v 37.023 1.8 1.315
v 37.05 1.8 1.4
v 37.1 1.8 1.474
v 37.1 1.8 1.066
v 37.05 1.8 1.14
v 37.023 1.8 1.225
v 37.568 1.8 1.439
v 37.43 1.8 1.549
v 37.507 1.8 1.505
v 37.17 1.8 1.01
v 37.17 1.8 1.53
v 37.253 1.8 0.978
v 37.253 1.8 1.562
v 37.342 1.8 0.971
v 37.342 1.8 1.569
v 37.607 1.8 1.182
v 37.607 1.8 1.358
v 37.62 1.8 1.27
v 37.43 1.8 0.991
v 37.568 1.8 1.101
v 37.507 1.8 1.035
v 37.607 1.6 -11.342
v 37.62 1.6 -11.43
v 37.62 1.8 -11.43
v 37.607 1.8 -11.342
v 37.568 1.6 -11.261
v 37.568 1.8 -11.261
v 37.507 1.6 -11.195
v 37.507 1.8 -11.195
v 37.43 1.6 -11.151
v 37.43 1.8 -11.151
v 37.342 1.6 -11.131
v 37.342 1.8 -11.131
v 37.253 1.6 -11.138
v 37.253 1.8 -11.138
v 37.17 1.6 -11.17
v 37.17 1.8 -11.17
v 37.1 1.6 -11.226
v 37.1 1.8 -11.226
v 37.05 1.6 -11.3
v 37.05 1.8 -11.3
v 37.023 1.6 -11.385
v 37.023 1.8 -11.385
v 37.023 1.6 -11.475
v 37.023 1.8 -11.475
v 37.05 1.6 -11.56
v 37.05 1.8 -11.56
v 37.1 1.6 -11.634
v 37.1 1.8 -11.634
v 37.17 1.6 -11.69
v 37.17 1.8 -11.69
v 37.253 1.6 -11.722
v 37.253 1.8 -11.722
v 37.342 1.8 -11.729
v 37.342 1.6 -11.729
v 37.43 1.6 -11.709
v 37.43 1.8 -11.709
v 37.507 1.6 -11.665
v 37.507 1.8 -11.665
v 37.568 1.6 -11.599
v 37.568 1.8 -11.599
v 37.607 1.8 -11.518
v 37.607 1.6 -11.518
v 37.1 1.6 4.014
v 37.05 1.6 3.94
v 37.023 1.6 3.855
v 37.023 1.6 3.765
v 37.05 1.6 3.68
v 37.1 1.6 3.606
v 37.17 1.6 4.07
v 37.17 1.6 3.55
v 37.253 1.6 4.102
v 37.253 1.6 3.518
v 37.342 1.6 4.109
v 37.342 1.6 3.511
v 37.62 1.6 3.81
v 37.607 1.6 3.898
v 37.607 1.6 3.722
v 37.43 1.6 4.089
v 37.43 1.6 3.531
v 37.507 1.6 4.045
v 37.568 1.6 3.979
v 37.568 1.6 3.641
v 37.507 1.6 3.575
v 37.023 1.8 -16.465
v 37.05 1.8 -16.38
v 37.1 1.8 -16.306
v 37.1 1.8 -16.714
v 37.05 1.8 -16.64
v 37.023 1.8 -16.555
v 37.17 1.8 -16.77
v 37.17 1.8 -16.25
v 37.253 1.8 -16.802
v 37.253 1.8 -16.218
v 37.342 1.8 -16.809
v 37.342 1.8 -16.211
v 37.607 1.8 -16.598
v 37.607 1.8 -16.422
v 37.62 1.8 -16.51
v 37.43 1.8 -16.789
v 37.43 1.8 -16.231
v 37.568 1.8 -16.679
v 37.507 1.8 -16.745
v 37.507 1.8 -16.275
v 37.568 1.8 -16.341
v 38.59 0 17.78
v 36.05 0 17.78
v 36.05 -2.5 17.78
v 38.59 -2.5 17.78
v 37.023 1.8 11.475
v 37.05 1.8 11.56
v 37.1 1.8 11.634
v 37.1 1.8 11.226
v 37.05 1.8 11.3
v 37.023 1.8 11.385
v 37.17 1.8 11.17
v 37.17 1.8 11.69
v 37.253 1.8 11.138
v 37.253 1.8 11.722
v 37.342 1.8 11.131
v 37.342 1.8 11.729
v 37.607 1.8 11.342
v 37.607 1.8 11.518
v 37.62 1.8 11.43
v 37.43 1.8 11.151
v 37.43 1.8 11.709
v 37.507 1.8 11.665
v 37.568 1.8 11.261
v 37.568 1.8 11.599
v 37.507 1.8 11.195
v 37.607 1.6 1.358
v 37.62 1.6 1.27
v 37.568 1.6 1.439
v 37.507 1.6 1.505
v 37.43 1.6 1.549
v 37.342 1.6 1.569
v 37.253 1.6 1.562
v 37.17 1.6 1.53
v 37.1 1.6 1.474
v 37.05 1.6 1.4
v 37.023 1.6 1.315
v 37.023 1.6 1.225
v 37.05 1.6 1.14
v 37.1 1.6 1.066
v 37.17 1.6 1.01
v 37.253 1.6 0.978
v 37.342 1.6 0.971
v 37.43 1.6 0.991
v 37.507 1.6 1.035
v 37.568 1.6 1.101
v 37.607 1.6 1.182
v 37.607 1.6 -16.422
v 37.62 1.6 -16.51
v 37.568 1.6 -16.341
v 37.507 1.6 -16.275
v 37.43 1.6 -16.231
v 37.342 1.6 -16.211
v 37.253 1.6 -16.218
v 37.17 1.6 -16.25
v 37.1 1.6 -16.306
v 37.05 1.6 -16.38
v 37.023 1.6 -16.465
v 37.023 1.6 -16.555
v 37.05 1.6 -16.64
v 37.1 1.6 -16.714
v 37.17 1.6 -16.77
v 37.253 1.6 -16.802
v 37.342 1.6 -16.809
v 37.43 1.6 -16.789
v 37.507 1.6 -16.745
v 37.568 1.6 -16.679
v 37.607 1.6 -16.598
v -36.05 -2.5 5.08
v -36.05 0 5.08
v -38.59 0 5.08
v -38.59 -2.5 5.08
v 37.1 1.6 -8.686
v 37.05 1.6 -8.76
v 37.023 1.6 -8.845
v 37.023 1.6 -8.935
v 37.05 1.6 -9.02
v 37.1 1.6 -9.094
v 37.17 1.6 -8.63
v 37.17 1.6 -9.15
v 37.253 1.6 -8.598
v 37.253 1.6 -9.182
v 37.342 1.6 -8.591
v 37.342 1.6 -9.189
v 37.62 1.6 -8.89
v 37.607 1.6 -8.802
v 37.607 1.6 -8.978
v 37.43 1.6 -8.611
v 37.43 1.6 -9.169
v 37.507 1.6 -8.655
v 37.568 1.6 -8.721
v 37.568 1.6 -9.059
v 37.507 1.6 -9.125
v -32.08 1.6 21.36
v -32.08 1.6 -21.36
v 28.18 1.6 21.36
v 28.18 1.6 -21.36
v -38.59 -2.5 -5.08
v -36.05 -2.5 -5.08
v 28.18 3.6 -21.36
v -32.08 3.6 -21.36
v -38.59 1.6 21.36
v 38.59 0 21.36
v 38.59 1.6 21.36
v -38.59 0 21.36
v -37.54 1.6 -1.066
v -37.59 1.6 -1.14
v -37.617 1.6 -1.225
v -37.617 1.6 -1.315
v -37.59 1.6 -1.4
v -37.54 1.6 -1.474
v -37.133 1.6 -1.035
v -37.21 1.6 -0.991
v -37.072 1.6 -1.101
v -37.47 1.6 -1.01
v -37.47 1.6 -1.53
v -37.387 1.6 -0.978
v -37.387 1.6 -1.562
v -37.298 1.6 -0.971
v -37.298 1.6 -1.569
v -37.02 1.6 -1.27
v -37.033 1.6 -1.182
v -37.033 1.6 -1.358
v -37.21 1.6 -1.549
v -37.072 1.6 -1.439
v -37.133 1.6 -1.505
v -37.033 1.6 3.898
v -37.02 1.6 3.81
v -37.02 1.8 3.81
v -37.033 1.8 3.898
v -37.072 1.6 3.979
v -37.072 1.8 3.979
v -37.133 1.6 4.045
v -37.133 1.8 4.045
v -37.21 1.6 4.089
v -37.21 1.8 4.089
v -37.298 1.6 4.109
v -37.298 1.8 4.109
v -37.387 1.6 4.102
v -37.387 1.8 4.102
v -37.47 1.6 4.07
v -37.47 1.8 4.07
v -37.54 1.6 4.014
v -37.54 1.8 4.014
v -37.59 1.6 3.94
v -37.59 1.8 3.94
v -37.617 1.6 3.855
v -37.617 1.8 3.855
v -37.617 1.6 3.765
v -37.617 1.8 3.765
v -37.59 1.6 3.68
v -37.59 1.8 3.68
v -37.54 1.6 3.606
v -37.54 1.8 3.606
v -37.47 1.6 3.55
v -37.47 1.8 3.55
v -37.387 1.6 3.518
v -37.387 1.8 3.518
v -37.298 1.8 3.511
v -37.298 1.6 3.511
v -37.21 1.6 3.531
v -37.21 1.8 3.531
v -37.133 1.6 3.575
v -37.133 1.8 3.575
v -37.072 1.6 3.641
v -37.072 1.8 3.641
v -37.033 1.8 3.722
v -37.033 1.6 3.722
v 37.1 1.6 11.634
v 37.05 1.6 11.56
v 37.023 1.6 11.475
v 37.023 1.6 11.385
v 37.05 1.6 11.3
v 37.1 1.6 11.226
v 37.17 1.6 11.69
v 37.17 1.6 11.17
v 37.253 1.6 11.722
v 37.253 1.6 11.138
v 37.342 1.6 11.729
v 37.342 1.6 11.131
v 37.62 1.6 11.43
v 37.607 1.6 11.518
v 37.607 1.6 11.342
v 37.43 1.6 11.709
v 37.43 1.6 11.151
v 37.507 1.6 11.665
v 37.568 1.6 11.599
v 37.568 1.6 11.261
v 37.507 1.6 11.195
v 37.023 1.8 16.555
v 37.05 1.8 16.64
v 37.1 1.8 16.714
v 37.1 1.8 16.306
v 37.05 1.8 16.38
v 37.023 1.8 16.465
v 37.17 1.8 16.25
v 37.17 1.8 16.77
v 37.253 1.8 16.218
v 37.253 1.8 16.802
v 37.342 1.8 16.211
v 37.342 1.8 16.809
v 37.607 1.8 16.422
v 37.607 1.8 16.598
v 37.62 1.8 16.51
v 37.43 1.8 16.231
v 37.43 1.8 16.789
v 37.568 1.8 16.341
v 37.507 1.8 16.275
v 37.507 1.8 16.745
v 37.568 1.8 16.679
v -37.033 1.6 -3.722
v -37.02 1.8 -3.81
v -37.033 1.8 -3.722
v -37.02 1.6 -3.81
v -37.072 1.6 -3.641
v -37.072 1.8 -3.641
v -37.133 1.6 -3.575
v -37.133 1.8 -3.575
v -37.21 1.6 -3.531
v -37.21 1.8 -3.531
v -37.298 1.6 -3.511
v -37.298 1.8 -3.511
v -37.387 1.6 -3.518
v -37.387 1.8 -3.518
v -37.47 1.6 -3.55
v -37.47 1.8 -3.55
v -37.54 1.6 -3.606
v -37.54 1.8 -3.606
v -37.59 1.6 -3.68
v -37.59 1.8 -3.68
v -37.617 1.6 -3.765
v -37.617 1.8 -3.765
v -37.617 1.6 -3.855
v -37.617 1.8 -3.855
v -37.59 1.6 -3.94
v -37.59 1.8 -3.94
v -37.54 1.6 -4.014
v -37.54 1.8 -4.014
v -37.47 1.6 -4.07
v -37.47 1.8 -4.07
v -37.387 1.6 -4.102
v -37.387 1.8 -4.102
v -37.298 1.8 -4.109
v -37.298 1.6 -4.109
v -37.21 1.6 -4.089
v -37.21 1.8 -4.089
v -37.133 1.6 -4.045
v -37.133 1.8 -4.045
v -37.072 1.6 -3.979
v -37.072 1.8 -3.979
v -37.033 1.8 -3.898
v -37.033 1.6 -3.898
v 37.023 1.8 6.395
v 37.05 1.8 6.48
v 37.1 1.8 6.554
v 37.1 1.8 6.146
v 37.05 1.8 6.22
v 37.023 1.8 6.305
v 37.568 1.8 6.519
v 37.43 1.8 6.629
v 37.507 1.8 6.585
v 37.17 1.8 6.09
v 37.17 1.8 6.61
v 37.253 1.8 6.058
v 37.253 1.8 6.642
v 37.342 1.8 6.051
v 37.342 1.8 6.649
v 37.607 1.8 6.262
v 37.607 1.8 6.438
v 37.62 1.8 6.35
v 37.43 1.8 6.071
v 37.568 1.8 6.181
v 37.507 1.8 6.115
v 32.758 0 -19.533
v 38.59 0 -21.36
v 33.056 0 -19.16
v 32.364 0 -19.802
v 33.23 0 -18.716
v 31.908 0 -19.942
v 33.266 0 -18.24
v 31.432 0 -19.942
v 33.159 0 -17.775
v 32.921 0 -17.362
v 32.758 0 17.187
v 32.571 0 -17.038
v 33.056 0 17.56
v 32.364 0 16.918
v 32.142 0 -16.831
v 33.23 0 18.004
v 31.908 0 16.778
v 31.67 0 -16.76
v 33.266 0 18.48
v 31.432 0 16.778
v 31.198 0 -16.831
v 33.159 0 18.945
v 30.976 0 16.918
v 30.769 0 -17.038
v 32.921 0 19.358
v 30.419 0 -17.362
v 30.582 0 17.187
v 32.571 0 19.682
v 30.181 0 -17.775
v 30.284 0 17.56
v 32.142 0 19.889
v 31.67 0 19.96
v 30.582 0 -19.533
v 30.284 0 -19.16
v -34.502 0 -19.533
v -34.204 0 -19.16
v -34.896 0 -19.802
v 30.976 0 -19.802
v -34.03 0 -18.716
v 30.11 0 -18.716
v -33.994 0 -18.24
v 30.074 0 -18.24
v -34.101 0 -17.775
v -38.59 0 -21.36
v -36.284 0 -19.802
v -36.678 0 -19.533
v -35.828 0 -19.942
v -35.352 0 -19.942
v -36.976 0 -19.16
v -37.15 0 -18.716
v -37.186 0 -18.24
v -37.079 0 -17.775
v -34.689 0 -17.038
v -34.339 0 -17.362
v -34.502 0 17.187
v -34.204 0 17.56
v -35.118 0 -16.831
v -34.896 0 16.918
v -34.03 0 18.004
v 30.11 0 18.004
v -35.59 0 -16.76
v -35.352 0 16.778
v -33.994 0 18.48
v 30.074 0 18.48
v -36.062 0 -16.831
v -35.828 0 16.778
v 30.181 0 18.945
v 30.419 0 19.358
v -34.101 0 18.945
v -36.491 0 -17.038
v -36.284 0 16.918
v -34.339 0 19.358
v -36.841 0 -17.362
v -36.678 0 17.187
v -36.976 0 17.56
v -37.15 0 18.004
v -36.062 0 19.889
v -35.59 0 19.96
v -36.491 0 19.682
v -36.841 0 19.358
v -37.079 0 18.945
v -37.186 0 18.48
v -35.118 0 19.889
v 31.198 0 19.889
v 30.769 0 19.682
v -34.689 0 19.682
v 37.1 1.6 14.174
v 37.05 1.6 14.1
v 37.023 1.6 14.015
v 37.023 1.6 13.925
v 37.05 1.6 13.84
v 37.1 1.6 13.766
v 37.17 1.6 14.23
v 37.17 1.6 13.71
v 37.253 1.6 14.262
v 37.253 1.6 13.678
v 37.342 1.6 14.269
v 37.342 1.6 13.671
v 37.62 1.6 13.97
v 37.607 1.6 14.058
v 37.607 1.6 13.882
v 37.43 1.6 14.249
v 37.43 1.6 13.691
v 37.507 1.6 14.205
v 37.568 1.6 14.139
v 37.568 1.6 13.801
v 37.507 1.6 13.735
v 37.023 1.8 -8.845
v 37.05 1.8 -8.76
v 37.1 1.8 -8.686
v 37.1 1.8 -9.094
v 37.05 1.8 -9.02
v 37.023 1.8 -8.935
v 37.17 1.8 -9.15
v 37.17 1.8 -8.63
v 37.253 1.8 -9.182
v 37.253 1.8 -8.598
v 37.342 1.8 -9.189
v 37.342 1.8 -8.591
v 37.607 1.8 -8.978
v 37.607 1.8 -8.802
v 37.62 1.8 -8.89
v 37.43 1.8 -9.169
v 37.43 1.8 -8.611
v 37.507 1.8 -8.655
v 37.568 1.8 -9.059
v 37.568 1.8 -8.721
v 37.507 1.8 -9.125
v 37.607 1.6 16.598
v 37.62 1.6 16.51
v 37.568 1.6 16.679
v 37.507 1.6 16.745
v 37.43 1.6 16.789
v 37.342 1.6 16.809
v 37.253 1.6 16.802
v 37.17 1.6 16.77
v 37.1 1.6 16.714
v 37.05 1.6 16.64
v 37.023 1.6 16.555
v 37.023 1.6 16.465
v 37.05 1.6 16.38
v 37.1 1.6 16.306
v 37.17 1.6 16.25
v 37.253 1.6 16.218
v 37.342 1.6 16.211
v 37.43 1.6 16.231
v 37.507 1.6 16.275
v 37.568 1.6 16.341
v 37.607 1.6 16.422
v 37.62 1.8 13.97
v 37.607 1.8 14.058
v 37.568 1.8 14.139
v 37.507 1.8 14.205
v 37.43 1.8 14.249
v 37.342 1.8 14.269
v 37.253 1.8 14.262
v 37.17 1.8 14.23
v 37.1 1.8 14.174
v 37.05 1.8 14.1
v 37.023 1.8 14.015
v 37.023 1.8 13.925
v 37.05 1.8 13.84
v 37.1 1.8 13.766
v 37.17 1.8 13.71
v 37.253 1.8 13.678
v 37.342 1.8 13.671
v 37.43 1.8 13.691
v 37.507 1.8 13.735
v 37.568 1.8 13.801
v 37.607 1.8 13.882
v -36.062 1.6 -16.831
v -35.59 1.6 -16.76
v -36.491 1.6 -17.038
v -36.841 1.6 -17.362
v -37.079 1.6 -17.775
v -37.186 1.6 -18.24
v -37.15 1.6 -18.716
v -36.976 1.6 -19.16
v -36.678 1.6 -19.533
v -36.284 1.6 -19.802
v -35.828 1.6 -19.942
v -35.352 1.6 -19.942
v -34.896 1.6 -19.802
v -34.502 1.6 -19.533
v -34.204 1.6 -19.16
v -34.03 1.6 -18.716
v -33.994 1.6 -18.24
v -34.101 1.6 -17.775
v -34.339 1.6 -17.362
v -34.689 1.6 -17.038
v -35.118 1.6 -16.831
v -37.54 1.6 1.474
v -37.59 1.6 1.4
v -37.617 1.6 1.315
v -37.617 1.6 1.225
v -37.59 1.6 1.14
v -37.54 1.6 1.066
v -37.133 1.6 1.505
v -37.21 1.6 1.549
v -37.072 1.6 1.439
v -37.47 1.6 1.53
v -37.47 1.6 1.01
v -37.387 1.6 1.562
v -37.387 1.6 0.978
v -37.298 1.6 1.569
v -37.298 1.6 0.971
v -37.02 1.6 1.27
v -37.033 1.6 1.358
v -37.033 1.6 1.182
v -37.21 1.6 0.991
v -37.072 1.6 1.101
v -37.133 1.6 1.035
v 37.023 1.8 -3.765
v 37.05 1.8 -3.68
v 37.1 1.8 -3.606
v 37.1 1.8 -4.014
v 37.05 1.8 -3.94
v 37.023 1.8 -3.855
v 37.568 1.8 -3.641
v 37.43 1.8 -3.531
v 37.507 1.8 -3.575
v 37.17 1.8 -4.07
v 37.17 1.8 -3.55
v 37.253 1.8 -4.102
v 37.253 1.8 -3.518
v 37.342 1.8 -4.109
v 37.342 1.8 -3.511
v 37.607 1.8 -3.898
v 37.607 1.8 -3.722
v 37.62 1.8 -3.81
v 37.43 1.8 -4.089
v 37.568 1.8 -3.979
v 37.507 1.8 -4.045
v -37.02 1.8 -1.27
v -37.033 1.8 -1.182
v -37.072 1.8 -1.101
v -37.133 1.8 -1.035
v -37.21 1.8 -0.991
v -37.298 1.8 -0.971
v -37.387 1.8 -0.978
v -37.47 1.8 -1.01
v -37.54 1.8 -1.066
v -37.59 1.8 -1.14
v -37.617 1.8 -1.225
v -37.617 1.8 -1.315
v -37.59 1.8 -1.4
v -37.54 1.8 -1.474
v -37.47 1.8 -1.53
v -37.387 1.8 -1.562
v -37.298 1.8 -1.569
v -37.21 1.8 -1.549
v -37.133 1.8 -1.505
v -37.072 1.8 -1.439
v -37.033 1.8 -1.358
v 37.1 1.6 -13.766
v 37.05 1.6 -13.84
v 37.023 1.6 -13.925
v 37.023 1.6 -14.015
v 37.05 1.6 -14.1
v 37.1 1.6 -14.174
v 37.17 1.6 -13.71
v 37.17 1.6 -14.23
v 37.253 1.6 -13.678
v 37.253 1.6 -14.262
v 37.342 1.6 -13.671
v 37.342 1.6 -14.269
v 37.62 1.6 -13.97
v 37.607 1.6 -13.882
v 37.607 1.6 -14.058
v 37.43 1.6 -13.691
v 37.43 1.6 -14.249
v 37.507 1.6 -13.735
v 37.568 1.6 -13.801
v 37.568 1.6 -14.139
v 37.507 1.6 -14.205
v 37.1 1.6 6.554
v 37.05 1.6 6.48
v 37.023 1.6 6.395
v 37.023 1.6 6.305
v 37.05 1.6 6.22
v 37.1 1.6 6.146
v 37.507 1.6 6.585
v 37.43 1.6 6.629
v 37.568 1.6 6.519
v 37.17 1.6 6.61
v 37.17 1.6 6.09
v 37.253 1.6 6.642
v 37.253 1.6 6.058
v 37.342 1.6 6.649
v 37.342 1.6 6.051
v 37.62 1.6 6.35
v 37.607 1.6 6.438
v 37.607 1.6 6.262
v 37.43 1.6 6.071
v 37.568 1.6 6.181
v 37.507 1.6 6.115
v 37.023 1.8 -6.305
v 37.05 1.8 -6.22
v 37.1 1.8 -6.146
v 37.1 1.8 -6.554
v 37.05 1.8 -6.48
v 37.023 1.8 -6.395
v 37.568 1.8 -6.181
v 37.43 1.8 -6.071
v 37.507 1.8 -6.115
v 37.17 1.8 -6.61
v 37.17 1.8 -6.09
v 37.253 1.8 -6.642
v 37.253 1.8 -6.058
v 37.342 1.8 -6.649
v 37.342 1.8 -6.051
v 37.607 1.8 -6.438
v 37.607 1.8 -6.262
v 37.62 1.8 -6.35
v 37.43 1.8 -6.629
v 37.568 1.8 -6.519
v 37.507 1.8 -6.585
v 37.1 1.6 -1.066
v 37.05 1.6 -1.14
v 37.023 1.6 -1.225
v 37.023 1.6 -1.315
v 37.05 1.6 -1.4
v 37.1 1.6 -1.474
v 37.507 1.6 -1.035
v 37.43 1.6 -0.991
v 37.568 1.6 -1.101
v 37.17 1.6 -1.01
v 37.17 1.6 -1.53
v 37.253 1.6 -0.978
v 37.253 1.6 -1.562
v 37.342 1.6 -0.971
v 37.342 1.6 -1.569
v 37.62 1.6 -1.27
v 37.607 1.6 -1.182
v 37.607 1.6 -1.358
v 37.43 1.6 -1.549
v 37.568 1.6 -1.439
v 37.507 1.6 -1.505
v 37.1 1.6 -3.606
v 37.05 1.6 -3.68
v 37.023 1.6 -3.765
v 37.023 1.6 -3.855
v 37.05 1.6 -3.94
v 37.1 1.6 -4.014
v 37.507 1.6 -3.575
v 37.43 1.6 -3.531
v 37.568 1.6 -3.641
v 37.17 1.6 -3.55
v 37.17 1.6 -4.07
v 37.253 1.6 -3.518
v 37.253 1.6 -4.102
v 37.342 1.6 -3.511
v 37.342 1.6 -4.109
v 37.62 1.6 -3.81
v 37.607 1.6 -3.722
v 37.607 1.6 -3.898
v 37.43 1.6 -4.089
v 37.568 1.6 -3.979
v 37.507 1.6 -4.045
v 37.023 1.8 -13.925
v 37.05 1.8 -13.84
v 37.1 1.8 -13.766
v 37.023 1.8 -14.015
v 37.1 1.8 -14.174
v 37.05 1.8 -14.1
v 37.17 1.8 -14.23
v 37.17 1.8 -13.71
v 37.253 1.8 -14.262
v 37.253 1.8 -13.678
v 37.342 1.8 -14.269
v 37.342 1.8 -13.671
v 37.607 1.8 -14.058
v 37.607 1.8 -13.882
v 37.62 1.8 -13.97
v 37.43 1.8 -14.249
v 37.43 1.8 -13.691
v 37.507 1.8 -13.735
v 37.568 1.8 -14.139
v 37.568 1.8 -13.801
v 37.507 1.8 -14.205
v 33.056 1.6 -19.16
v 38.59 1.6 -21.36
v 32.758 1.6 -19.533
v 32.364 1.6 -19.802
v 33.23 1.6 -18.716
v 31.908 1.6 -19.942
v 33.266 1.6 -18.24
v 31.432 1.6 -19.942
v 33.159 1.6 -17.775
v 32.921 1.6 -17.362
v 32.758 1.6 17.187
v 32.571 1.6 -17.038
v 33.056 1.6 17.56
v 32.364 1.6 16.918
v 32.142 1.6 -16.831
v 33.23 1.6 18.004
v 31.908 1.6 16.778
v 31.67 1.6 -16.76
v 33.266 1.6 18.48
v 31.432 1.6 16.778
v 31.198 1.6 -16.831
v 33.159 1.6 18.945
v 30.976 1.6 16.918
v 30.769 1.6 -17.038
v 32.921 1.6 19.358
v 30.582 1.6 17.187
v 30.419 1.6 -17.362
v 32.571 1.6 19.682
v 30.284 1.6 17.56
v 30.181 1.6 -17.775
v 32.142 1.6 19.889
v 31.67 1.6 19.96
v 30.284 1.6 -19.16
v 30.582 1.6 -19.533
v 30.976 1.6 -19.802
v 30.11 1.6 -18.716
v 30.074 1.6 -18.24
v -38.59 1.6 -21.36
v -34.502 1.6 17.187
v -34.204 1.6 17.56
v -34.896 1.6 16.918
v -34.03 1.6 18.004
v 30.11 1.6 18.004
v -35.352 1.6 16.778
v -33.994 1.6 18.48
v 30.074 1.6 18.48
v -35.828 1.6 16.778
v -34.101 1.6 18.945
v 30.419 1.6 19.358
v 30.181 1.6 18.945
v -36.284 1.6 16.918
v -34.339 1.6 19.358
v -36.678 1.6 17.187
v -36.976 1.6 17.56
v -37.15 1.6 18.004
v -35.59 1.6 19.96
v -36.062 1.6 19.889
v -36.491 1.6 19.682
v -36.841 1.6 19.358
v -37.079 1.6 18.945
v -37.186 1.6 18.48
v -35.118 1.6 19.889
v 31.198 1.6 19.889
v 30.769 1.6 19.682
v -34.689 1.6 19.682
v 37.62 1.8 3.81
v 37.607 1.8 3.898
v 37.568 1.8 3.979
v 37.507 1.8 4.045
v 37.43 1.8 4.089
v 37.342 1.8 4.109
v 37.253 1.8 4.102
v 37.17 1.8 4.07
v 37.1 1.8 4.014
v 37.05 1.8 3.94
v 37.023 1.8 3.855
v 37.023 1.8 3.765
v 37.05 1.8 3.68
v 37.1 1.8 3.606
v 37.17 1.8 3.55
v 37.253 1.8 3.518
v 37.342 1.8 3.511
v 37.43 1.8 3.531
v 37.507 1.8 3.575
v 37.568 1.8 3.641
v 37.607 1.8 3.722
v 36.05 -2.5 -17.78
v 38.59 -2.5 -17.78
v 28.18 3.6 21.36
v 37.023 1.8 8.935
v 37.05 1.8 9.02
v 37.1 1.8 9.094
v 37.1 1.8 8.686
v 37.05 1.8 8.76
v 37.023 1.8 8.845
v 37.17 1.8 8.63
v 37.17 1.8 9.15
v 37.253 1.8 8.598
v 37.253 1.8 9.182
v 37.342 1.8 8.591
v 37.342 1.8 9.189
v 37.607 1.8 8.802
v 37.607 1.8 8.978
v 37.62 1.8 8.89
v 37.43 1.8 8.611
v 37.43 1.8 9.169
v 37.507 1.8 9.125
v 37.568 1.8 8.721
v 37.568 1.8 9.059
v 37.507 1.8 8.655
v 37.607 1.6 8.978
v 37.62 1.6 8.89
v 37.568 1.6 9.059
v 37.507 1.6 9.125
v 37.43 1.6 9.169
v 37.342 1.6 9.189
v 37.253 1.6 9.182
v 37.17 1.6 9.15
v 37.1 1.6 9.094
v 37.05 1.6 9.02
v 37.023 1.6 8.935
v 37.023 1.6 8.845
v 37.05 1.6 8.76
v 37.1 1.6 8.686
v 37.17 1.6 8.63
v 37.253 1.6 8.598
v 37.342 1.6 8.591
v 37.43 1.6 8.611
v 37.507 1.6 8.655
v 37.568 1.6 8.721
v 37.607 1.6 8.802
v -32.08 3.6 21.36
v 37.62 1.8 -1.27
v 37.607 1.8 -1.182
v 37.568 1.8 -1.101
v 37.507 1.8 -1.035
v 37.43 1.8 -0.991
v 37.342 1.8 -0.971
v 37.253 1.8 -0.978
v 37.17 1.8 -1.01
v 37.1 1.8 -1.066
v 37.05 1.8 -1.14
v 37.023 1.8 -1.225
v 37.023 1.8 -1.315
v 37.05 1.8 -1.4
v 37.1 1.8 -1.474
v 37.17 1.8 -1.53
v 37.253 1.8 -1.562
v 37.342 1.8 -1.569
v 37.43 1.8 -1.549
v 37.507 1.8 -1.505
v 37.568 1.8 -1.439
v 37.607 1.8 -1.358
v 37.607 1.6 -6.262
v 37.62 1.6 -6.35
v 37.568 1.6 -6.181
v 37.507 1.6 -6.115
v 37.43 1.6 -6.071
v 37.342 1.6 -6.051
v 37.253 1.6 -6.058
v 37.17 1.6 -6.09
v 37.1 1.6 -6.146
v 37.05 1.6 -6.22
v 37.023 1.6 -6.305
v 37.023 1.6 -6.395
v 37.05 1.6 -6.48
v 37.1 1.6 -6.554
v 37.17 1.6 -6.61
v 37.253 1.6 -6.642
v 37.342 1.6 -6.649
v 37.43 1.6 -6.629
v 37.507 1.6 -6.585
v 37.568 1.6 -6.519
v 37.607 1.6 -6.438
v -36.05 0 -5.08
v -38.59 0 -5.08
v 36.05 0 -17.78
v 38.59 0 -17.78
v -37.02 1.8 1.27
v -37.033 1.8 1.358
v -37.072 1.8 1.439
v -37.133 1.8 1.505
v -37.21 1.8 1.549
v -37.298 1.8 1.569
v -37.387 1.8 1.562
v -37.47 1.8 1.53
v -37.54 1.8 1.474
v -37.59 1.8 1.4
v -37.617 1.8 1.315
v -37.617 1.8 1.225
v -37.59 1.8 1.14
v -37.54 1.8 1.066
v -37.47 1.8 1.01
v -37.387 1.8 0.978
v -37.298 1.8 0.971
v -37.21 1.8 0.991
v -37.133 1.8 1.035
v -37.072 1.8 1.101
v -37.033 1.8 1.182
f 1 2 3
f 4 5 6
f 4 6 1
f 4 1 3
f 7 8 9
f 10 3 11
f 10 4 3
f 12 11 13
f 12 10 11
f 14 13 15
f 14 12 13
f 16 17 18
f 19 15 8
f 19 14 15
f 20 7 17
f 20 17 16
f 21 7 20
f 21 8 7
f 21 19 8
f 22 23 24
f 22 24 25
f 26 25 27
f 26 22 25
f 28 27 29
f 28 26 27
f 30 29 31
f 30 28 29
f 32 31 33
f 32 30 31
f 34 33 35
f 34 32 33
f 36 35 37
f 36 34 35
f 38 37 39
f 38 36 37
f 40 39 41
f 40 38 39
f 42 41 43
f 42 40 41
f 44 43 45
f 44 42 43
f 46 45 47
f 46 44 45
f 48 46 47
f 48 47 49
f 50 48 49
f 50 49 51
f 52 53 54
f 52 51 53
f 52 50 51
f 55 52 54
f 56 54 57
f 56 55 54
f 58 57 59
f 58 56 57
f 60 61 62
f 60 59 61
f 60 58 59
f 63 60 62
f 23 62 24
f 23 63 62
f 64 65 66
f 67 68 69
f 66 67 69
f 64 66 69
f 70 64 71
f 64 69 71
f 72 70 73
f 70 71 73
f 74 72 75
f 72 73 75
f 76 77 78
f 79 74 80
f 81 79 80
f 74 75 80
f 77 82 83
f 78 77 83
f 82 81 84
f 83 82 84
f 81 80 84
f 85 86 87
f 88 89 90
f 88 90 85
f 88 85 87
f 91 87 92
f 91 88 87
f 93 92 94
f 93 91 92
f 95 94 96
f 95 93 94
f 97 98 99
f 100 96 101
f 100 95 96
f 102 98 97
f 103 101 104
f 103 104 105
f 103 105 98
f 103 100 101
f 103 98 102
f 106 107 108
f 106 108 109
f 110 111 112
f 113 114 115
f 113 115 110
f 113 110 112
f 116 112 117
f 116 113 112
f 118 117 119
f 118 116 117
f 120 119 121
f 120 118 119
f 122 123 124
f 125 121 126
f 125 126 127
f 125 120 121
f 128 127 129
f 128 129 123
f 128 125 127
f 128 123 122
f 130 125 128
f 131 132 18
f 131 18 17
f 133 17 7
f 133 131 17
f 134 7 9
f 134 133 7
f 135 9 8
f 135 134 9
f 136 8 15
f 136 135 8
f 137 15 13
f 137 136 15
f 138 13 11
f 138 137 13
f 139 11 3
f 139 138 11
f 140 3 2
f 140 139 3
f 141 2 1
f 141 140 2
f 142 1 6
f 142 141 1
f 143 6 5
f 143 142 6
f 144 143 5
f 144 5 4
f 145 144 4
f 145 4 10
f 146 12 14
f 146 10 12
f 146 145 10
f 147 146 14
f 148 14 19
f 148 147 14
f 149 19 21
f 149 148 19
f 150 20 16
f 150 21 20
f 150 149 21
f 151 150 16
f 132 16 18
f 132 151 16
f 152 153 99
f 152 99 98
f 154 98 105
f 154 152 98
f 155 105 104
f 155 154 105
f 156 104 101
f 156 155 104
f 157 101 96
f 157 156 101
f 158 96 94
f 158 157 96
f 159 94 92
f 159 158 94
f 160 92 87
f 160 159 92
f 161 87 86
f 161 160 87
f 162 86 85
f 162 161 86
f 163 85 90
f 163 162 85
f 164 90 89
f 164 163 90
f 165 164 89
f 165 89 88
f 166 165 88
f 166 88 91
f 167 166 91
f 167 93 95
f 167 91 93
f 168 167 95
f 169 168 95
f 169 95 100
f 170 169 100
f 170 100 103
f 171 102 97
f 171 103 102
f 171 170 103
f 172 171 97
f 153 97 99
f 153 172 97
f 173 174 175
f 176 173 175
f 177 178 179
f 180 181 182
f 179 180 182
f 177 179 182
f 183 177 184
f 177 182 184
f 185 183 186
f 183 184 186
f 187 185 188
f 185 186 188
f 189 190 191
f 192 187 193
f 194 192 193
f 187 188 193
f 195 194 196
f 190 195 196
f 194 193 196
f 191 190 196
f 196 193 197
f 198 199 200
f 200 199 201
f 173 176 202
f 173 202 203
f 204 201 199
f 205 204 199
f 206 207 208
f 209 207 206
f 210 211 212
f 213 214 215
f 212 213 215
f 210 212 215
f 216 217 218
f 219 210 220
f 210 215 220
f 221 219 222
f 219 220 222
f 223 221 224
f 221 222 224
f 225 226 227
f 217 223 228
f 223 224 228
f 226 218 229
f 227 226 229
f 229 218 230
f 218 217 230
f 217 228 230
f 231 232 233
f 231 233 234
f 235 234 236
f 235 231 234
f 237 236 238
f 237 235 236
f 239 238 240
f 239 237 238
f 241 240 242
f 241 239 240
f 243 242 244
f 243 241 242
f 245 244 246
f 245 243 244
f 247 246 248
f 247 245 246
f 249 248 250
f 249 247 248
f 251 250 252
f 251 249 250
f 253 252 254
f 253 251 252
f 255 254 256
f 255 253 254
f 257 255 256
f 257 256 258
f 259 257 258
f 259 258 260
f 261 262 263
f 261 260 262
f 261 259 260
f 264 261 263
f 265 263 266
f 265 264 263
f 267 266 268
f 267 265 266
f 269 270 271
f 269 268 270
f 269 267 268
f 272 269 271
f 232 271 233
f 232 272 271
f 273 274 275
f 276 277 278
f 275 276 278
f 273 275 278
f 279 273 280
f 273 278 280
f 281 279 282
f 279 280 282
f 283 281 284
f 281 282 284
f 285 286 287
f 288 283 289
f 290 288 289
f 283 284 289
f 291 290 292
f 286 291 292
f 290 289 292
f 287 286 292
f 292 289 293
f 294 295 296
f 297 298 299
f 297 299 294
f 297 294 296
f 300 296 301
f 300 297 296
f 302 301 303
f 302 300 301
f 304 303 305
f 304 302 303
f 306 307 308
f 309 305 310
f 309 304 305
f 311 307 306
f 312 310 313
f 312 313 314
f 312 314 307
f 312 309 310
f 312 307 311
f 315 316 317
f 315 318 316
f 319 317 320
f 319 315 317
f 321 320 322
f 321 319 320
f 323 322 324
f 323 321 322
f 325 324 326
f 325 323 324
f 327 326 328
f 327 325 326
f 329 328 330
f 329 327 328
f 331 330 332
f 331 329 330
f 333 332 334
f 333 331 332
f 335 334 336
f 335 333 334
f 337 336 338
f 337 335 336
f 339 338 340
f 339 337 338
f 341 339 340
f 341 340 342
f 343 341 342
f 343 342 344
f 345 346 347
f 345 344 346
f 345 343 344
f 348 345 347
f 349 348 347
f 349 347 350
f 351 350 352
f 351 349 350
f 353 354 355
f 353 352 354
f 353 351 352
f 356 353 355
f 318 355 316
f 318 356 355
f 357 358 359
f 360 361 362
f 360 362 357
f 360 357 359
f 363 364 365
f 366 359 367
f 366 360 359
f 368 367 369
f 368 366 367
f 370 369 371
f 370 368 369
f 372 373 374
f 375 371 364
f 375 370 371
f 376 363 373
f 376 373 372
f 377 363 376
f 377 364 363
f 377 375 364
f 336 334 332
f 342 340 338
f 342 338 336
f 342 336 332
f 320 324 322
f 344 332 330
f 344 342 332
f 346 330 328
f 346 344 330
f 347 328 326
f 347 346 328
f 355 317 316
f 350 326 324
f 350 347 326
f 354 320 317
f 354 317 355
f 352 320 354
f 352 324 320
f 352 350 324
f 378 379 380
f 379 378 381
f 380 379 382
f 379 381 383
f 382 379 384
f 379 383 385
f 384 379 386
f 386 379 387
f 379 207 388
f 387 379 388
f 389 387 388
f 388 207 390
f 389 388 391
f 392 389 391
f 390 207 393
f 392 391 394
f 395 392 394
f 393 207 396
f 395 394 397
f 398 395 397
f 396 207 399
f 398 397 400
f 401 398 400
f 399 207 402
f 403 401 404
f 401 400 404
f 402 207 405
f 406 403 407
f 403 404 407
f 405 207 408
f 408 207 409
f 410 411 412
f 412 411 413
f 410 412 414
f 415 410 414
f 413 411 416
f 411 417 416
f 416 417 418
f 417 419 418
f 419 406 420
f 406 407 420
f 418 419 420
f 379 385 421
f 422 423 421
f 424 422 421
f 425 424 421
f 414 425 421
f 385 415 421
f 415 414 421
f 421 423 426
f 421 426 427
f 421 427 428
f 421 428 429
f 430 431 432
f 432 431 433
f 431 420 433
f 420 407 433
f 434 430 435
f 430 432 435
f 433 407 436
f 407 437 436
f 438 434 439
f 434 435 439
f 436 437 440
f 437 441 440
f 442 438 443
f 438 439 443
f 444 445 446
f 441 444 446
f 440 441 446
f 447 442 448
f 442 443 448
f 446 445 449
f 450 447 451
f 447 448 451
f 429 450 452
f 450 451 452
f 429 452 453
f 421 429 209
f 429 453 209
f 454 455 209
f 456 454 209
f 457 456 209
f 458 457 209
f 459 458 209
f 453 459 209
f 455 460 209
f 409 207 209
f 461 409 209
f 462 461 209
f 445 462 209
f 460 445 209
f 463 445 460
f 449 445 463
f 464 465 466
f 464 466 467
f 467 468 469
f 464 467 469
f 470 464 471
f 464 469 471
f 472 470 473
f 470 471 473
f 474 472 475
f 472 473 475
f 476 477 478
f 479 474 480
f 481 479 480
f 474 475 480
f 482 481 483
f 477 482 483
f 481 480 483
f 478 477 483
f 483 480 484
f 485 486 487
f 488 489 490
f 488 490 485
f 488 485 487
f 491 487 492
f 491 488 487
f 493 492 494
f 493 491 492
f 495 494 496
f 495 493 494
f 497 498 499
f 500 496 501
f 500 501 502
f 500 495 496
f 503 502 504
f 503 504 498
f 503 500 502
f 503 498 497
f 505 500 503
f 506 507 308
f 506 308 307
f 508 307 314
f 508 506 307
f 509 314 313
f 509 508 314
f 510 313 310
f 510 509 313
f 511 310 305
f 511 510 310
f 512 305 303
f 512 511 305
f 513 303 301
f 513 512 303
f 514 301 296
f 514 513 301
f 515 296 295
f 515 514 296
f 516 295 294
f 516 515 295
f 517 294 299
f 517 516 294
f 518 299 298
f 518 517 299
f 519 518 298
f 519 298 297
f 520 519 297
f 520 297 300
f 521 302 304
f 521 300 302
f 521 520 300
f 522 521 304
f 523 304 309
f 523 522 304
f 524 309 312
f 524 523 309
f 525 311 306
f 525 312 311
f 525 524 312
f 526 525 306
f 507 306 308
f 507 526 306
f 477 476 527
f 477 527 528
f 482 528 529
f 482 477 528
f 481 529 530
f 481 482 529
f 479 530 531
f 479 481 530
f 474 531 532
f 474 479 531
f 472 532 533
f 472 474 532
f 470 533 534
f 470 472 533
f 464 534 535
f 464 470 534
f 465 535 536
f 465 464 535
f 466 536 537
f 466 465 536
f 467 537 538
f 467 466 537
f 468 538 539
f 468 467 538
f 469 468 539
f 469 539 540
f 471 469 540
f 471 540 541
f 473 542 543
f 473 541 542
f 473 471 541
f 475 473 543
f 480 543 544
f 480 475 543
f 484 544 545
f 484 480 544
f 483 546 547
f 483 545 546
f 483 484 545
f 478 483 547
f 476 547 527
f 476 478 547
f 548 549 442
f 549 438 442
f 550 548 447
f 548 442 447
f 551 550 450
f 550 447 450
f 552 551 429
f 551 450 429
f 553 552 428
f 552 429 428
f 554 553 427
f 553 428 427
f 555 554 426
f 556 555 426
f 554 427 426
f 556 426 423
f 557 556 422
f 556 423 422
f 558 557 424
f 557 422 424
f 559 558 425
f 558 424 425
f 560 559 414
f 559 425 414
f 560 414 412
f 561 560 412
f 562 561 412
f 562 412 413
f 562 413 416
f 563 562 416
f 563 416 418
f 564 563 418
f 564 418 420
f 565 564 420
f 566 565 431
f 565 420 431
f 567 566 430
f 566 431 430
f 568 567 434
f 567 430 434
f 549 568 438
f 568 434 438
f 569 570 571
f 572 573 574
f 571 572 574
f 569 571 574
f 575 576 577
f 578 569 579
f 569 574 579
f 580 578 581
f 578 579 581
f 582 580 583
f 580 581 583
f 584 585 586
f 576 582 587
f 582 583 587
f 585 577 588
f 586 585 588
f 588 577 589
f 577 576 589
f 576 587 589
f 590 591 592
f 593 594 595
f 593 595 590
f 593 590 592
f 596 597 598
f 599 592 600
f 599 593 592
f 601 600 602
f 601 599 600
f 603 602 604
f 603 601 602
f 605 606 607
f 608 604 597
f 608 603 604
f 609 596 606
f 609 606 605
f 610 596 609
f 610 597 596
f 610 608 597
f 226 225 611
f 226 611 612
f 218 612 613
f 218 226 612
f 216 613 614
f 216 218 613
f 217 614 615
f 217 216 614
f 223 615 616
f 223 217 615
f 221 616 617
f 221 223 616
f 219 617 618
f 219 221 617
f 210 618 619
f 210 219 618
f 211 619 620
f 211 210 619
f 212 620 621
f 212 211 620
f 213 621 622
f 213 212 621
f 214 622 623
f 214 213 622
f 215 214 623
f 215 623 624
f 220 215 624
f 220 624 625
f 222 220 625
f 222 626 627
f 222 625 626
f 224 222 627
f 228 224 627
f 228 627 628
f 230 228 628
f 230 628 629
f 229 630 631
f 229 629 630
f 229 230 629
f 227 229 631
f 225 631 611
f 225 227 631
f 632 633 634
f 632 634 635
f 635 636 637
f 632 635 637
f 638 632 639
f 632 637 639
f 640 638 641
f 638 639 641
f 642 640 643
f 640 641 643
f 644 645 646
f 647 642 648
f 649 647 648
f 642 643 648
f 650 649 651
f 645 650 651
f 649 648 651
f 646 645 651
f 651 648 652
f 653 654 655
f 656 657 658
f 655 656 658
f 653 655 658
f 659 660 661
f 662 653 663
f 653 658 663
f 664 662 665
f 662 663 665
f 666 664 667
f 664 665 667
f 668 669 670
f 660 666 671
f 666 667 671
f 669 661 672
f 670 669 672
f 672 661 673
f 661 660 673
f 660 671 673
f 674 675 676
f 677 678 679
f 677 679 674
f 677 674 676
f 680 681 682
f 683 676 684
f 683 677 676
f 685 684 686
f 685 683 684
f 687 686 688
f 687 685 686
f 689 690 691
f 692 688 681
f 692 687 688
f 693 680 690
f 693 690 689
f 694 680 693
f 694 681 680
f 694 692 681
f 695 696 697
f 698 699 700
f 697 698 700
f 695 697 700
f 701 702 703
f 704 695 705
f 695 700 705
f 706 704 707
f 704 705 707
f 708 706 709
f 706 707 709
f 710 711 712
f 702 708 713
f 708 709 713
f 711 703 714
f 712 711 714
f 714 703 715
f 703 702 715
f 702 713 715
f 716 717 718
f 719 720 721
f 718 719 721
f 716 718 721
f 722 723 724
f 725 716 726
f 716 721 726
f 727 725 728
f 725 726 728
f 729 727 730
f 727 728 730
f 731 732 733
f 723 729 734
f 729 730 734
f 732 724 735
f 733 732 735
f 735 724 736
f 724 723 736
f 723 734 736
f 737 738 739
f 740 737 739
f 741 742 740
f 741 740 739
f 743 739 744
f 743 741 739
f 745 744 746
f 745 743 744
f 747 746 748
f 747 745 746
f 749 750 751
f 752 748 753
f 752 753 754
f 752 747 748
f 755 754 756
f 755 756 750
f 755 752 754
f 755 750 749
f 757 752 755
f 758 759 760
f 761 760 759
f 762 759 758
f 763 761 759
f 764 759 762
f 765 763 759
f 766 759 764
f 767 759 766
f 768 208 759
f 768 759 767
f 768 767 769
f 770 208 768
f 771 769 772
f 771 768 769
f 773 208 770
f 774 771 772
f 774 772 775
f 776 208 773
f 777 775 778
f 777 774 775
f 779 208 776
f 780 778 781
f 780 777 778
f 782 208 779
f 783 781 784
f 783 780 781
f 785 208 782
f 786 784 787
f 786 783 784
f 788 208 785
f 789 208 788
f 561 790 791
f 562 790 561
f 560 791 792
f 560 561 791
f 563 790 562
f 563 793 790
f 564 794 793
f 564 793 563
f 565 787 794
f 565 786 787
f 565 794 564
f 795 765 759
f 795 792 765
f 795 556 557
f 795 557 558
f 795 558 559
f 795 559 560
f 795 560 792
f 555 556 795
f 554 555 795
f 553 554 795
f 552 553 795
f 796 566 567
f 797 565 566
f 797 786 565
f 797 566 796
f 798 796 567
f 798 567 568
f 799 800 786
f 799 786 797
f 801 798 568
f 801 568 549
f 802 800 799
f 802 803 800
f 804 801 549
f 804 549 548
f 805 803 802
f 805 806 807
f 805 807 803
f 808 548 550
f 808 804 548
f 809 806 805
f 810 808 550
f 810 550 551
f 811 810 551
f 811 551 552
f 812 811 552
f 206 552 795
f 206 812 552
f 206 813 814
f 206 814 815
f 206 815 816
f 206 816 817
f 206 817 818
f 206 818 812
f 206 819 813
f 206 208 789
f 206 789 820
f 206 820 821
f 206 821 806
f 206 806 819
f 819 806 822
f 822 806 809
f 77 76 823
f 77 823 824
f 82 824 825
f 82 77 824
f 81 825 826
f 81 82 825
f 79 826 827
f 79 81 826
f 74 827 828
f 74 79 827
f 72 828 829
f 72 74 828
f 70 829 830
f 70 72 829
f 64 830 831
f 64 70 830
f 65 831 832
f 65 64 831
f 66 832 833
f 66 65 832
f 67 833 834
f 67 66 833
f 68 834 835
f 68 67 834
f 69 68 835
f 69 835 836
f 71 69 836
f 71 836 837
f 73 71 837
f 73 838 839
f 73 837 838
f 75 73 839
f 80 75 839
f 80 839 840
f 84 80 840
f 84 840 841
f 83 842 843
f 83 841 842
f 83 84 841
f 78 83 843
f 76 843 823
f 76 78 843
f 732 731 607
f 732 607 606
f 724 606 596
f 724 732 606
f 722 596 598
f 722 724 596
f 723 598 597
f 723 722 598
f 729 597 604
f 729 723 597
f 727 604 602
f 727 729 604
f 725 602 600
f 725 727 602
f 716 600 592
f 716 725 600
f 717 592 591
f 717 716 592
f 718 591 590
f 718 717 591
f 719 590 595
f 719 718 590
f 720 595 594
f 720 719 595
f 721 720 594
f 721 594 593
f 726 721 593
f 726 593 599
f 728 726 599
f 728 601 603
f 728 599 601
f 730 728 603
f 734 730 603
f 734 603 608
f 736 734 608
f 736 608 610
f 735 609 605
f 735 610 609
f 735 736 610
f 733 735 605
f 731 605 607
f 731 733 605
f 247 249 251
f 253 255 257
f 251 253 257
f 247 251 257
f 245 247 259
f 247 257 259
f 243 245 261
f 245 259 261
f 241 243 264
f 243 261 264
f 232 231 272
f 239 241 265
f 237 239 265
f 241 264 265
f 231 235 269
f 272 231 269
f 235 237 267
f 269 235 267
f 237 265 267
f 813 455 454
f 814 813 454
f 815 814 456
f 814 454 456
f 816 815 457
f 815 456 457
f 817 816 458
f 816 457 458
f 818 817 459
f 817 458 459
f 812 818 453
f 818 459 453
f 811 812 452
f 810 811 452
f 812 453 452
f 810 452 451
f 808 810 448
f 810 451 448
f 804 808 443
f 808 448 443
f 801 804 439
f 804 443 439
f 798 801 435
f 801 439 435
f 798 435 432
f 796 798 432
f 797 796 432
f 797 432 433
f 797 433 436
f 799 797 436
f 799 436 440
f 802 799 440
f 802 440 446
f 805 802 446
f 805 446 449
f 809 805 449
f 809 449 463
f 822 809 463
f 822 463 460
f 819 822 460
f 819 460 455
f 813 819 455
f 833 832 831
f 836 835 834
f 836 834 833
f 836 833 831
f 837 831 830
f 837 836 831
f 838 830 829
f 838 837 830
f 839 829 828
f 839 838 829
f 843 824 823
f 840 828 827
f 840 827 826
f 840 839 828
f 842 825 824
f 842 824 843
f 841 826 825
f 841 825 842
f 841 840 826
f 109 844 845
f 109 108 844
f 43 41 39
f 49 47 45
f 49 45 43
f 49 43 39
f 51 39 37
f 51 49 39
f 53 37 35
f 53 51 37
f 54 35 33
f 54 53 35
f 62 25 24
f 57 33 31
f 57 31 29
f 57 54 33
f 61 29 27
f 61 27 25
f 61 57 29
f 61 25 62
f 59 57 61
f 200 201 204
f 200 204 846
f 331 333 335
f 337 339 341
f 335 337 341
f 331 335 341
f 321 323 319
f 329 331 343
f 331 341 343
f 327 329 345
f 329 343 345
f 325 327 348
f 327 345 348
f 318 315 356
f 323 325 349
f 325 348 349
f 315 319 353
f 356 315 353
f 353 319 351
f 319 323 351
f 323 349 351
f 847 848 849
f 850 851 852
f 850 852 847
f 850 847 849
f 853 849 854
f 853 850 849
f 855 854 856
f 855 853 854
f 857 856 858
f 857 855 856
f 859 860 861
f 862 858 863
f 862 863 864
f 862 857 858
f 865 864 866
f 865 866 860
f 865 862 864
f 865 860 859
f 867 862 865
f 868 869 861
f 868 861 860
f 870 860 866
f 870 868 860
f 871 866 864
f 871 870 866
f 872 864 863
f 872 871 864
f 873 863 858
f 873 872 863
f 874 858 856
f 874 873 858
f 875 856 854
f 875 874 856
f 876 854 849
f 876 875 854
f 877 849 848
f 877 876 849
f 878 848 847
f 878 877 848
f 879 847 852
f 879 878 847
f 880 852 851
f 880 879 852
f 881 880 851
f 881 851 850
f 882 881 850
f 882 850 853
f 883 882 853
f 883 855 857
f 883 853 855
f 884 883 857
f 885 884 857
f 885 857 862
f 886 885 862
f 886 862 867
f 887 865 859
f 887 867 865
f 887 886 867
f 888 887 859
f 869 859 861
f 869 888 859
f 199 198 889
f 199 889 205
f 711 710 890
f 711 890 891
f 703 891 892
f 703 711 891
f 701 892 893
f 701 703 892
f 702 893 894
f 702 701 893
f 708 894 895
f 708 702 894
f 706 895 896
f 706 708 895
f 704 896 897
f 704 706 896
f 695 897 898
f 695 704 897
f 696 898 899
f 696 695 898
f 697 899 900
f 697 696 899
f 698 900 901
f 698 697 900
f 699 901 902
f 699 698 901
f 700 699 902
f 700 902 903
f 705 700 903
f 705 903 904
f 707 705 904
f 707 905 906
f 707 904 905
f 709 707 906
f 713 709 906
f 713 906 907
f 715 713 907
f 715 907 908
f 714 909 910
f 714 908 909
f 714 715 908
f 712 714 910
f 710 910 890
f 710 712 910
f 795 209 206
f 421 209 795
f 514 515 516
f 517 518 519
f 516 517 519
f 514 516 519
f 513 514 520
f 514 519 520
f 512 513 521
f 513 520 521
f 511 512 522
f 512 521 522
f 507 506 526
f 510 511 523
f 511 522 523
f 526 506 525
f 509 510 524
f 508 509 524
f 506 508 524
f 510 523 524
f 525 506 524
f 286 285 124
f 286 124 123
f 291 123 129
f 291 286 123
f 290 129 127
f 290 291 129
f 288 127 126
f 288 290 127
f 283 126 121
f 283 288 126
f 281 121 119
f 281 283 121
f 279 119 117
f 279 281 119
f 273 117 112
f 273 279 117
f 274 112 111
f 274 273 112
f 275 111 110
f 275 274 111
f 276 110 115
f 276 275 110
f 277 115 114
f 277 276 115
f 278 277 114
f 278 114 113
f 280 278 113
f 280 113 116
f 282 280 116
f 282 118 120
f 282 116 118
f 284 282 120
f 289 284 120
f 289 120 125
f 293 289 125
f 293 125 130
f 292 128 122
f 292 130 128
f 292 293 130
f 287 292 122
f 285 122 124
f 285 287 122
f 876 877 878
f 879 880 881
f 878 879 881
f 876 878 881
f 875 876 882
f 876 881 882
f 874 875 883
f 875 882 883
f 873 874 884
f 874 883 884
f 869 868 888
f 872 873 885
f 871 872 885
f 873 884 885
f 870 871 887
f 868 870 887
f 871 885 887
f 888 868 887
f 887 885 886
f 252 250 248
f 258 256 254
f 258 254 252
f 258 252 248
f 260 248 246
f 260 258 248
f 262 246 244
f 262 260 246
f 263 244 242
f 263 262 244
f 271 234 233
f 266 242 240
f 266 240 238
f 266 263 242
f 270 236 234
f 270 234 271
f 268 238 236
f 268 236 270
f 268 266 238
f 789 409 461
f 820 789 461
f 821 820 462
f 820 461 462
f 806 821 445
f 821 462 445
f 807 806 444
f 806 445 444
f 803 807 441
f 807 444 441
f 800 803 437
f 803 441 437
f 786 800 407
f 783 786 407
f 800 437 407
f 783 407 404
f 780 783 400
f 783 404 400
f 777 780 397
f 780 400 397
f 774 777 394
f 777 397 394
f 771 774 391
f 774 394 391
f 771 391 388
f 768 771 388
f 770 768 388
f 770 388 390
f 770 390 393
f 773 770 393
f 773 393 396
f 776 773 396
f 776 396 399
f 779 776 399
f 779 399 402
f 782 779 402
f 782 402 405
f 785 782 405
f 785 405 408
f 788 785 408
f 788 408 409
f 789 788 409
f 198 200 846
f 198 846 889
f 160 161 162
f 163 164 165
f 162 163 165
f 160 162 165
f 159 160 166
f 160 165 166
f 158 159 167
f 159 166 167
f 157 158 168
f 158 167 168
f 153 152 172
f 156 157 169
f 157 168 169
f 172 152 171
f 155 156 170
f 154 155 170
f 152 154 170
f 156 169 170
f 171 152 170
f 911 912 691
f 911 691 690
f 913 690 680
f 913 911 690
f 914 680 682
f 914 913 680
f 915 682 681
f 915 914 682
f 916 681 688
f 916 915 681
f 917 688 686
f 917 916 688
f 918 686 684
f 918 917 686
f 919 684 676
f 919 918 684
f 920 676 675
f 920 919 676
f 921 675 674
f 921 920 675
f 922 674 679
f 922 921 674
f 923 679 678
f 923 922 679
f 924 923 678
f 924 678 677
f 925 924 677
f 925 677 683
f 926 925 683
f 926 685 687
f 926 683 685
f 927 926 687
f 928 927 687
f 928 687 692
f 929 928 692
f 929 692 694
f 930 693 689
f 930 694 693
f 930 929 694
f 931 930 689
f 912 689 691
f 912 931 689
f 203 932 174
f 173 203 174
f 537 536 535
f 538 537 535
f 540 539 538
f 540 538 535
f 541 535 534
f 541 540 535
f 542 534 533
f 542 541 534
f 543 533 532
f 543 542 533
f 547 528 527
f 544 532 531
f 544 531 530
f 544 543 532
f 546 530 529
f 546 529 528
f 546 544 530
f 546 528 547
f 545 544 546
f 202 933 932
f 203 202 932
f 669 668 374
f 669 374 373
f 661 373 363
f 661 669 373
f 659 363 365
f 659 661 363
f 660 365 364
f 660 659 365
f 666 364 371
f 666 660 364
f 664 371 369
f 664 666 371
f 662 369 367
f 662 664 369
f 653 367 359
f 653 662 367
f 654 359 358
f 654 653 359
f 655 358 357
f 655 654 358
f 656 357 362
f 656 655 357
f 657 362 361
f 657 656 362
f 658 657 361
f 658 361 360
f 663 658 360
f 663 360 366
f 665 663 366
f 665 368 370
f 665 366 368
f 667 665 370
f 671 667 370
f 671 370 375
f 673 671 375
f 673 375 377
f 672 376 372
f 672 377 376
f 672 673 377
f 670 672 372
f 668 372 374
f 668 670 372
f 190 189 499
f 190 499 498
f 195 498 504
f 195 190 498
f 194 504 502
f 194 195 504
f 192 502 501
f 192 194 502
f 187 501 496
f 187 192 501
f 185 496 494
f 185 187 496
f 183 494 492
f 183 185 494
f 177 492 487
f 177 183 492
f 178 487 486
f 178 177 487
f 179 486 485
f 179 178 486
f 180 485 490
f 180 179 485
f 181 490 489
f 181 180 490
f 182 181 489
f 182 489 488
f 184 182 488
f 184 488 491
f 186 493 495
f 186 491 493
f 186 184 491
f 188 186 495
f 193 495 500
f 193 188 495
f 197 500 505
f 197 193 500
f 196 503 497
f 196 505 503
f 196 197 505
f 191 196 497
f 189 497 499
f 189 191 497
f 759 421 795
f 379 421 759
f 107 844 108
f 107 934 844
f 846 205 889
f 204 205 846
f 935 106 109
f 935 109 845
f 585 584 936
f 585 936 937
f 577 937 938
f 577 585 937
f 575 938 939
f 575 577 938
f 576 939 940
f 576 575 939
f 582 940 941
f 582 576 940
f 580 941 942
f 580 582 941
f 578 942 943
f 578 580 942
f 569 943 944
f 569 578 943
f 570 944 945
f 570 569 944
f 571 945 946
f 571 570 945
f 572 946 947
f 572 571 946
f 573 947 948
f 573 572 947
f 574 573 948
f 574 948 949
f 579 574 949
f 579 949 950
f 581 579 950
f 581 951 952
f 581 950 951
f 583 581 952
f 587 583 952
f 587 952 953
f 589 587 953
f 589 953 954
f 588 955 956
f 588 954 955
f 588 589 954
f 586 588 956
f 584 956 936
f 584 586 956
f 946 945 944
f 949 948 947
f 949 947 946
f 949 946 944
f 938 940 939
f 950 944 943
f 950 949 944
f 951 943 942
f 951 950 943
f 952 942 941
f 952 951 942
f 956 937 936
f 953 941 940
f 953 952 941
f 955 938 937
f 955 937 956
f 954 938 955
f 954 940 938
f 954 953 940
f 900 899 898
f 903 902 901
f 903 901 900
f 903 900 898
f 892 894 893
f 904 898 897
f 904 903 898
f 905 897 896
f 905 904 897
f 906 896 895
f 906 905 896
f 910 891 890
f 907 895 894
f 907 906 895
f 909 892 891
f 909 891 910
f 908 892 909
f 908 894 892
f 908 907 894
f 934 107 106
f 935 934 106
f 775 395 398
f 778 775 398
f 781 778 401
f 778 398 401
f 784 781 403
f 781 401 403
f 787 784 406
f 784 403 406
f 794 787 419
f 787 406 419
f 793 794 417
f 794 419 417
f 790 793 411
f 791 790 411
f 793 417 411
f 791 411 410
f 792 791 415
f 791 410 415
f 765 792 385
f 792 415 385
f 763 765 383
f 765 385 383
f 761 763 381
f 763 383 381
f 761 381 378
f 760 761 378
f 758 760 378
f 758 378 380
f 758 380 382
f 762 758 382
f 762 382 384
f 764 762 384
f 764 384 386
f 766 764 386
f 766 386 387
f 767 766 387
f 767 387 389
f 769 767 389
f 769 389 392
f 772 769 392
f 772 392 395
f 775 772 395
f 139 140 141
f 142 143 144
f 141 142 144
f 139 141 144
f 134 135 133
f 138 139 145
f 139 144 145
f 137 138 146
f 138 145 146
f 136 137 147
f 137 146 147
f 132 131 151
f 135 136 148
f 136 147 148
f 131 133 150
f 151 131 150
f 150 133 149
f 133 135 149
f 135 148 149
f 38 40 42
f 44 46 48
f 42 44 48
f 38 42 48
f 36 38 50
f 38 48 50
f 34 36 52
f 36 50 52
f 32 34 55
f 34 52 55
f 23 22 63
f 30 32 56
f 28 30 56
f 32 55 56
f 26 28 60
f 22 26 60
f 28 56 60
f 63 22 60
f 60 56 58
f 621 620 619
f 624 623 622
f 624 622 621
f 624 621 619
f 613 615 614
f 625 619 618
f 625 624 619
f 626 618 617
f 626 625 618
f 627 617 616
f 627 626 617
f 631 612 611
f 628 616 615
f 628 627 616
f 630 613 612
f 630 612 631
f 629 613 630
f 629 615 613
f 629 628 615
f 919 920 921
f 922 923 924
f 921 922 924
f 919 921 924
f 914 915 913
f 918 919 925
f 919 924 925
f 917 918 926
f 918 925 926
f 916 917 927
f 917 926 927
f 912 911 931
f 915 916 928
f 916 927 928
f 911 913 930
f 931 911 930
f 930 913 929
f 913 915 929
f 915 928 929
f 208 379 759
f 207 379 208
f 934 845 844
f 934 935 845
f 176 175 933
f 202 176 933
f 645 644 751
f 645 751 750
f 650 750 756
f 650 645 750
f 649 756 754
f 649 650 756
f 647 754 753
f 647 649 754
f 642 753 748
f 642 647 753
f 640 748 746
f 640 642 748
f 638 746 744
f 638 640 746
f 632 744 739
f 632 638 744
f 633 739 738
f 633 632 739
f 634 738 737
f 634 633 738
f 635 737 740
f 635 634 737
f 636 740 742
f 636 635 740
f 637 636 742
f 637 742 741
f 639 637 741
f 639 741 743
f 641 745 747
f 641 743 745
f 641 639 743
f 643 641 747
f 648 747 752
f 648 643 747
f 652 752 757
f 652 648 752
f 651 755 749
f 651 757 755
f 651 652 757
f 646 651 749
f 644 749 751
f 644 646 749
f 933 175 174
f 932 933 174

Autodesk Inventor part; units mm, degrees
ref_plane "YZ Plane" through (0, 0, 0) normal (1, 0, 0) x (0, 1, 0)
ref_plane "XZ Plane" through (0, 0, 0) normal (0, 1, 0) x (-1, 0, 0)
ref_plane "XY Plane" through (0, 0, 0) normal (0, 0, 1) x (1, 0, 0)
sketch "Sketch1" plane through (0, 0, 0) normal (0, 1, 0) x (-1, 0, 0)
  line L0 (-38.59, 21.36) -> (38.59, 21.36)
  line L1 (38.59, 21.36) -> (38.59, -21.36)
  line L2 (38.59, -21.36) -> (-38.59, -21.36)
  line L3 (-38.59, -21.36) -> (-38.59, 21.36)
  line L4 (-38.59, 21.36) -> (38.59, -21.36) construction
  line L5 (38.59, 21.36) -> (-38.59, -21.36) construction
  point P0 (0, 0)
  dimension "d0" = 42.72
  dimension "d1" = 77.18
extrude "Extrusion1" add sketch "Sketch1" along normal blind 1.6
sketch "Sketch2" plane through (0, 1.6, 0) normal (0, 1, 0) x (1, 0, 0)
  line L0 (38.59, 21.36) -> (-38.59, 21.36) projected
  line L1 (28.18, -21.36) -> (-32.08, -21.36)
  line L2 (-32.08, -21.36) -> (-32.08, 21.36)
  line L3 (-32.08, 21.36) -> (28.18, 21.36)
  line L4 (28.18, 21.36) -> (28.18, -21.36)
  line L5 (28.18, -21.36) -> (-32.08, 21.36) construction
  line L6 (-32.08, -21.36) -> (28.18, 21.36) construction
  line L7 (38.59, -21.36) -> (38.59, 21.36) projected
  line L8 (-38.59, 21.36) -> (-38.59, -21.36) projected
  dimension "d4" = 60.26
  dimension "d5" = 10.41
extrude "Extrusion2" add sketch "Sketch2" along normal blind 2 separate body
sketch "Sketch3" plane through (0, 1.6, 0) normal (0, 1, 0) x (1, 0, 0)
  line L0 (38.59, -21.36) -> (38.59, 21.36) projected
  line L1 (38.59, 21.36) -> (-38.59, 21.36) projected
  line L2 (-38.59, -21.36) -> (38.59, -21.36) projected
  line L3 (-38.59, 21.36) -> (-38.59, -21.36) projected
  point P0 (0, 0)
  point P1 (31.67, 18.36)
  point P2 (28.18, 21.36)
  point P3 (31.67, -18.36)
  point P4 (-35.59, -18.36)
  point P5 (-35.59, 18.36)
  point P6 (-32.08, -21.36)
  dimension "d8" = 6.92
  dimension "d9" = 3
  dimension "d11" = 3
  dimension "d12" = 3
hole "Hole1" at (31.67, 1.6, -18.36) at (31.67, 1.6, 18.36) at (-35.59, 1.6, 18.36) at (-35.59, 1.6, -18.36) direction (0, -1, 0) diameter 3.2 end through all bodies 1
sketch "Sketch4" plane through (0, 0, 0) normal (0, -1, 0) x (1, 0, 0)
  line L0 (36.05, 17.78) -> (38.59, 17.78)
  line L1 (38.59, 17.78) -> (38.59, -17.78)
  line L2 (38.59, -17.78) -> (36.05, -17.78)
  line L3 (36.05, -17.78) -> (36.05, 17.78)
  line L4 (38.59, 21.36) -> (38.59, -21.36) projected
  line L5 (38.59, -21.36) -> (-38.59, -21.36) projected
  line L6 (-38.59, -5.08) -> (-36.05, -5.08)
  line L7 (-36.05, -5.08) -> (-36.05, 5.08)
  line L8 (-36.05, 5.08) -> (-38.59, 5.08)
  line L9 (-38.59, 5.08) -> (-38.59, -5.08)
  line L10 (-38.59, -21.36) -> (-38.59, 21.36) projected
  point P0 (0, 0)
  point P1 (37.32, -16.51)
  dimension "d20" = 2.54
  dimension "d21" = 1.27
  dimension "d22" = 1.27
  dimension "d23" = 4.85
  dimension "d24" = 35.56
  dimension "d39" = 2.54
  dimension "d40" = 10.16
  dimension "d41" = 5.08
extrude "Extrusion3" add sketch "Sketch4" along normal blind 2.5 separate body
sketch "Sketch5" plane through (0, 1.6, 0) normal (0, 1, 0) x (1, 0, 0)
  line L0 (38.59, 21.36) -> (-38.59, 21.36) projected
  line L1 (38.59, -21.36) -> (38.59, 21.36) projected
  circle A0 centre (37.32, 16.51) radius 0.3
  circle A1 centre (37.32, 13.97) radius 0.3
  circle A2 centre (37.32, 11.43) radius 0.3
  circle A3 centre (37.32, 8.89) radius 0.3
  circle A4 centre (37.32, 6.35) radius 0.3
  circle A5 centre (37.32, 3.81) radius 0.3
  circle A6 centre (37.32, 1.27) radius 0.3
  circle A7 centre (37.32, -1.27) radius 0.3
  circle A8 centre (37.32, -3.81) radius 0.3
  circle A9 centre (37.32, -6.35) radius 0.3
  circle A10 centre (37.32, -8.89) radius 0.3
  circle A11 centre (37.32, -11.43) radius 0.3
  circle A12 centre (37.32, -13.97) radius 0.3
  circle A13 centre (37.32, -16.51) radius 0.3
  line L2 (-38.59, 21.36) -> (-38.59, -21.36) projected
  circle A14 centre (-37.32, 3.81) radius 0.3
  circle A15 centre (-37.32, 1.27) radius 0.3
  circle A16 centre (-37.32, -1.27) radius 0.3
  circle A17 centre (-37.32, -3.81) radius 0.3
  point P0 (0, 0)
  dimension "d27" = 4.85
  dimension "d28" = 1.27
  dimension "d29" = 0.6
  dimension "d32" = 2.54
  dimension "d42" = 1.27
  dimension "d43" = 3.81
  dimension "d47" = 2.54
extrude "Extrusion4" add sketch "Sketch5" along normal blind 0.2 separate body
properties part number "LCD9341"
